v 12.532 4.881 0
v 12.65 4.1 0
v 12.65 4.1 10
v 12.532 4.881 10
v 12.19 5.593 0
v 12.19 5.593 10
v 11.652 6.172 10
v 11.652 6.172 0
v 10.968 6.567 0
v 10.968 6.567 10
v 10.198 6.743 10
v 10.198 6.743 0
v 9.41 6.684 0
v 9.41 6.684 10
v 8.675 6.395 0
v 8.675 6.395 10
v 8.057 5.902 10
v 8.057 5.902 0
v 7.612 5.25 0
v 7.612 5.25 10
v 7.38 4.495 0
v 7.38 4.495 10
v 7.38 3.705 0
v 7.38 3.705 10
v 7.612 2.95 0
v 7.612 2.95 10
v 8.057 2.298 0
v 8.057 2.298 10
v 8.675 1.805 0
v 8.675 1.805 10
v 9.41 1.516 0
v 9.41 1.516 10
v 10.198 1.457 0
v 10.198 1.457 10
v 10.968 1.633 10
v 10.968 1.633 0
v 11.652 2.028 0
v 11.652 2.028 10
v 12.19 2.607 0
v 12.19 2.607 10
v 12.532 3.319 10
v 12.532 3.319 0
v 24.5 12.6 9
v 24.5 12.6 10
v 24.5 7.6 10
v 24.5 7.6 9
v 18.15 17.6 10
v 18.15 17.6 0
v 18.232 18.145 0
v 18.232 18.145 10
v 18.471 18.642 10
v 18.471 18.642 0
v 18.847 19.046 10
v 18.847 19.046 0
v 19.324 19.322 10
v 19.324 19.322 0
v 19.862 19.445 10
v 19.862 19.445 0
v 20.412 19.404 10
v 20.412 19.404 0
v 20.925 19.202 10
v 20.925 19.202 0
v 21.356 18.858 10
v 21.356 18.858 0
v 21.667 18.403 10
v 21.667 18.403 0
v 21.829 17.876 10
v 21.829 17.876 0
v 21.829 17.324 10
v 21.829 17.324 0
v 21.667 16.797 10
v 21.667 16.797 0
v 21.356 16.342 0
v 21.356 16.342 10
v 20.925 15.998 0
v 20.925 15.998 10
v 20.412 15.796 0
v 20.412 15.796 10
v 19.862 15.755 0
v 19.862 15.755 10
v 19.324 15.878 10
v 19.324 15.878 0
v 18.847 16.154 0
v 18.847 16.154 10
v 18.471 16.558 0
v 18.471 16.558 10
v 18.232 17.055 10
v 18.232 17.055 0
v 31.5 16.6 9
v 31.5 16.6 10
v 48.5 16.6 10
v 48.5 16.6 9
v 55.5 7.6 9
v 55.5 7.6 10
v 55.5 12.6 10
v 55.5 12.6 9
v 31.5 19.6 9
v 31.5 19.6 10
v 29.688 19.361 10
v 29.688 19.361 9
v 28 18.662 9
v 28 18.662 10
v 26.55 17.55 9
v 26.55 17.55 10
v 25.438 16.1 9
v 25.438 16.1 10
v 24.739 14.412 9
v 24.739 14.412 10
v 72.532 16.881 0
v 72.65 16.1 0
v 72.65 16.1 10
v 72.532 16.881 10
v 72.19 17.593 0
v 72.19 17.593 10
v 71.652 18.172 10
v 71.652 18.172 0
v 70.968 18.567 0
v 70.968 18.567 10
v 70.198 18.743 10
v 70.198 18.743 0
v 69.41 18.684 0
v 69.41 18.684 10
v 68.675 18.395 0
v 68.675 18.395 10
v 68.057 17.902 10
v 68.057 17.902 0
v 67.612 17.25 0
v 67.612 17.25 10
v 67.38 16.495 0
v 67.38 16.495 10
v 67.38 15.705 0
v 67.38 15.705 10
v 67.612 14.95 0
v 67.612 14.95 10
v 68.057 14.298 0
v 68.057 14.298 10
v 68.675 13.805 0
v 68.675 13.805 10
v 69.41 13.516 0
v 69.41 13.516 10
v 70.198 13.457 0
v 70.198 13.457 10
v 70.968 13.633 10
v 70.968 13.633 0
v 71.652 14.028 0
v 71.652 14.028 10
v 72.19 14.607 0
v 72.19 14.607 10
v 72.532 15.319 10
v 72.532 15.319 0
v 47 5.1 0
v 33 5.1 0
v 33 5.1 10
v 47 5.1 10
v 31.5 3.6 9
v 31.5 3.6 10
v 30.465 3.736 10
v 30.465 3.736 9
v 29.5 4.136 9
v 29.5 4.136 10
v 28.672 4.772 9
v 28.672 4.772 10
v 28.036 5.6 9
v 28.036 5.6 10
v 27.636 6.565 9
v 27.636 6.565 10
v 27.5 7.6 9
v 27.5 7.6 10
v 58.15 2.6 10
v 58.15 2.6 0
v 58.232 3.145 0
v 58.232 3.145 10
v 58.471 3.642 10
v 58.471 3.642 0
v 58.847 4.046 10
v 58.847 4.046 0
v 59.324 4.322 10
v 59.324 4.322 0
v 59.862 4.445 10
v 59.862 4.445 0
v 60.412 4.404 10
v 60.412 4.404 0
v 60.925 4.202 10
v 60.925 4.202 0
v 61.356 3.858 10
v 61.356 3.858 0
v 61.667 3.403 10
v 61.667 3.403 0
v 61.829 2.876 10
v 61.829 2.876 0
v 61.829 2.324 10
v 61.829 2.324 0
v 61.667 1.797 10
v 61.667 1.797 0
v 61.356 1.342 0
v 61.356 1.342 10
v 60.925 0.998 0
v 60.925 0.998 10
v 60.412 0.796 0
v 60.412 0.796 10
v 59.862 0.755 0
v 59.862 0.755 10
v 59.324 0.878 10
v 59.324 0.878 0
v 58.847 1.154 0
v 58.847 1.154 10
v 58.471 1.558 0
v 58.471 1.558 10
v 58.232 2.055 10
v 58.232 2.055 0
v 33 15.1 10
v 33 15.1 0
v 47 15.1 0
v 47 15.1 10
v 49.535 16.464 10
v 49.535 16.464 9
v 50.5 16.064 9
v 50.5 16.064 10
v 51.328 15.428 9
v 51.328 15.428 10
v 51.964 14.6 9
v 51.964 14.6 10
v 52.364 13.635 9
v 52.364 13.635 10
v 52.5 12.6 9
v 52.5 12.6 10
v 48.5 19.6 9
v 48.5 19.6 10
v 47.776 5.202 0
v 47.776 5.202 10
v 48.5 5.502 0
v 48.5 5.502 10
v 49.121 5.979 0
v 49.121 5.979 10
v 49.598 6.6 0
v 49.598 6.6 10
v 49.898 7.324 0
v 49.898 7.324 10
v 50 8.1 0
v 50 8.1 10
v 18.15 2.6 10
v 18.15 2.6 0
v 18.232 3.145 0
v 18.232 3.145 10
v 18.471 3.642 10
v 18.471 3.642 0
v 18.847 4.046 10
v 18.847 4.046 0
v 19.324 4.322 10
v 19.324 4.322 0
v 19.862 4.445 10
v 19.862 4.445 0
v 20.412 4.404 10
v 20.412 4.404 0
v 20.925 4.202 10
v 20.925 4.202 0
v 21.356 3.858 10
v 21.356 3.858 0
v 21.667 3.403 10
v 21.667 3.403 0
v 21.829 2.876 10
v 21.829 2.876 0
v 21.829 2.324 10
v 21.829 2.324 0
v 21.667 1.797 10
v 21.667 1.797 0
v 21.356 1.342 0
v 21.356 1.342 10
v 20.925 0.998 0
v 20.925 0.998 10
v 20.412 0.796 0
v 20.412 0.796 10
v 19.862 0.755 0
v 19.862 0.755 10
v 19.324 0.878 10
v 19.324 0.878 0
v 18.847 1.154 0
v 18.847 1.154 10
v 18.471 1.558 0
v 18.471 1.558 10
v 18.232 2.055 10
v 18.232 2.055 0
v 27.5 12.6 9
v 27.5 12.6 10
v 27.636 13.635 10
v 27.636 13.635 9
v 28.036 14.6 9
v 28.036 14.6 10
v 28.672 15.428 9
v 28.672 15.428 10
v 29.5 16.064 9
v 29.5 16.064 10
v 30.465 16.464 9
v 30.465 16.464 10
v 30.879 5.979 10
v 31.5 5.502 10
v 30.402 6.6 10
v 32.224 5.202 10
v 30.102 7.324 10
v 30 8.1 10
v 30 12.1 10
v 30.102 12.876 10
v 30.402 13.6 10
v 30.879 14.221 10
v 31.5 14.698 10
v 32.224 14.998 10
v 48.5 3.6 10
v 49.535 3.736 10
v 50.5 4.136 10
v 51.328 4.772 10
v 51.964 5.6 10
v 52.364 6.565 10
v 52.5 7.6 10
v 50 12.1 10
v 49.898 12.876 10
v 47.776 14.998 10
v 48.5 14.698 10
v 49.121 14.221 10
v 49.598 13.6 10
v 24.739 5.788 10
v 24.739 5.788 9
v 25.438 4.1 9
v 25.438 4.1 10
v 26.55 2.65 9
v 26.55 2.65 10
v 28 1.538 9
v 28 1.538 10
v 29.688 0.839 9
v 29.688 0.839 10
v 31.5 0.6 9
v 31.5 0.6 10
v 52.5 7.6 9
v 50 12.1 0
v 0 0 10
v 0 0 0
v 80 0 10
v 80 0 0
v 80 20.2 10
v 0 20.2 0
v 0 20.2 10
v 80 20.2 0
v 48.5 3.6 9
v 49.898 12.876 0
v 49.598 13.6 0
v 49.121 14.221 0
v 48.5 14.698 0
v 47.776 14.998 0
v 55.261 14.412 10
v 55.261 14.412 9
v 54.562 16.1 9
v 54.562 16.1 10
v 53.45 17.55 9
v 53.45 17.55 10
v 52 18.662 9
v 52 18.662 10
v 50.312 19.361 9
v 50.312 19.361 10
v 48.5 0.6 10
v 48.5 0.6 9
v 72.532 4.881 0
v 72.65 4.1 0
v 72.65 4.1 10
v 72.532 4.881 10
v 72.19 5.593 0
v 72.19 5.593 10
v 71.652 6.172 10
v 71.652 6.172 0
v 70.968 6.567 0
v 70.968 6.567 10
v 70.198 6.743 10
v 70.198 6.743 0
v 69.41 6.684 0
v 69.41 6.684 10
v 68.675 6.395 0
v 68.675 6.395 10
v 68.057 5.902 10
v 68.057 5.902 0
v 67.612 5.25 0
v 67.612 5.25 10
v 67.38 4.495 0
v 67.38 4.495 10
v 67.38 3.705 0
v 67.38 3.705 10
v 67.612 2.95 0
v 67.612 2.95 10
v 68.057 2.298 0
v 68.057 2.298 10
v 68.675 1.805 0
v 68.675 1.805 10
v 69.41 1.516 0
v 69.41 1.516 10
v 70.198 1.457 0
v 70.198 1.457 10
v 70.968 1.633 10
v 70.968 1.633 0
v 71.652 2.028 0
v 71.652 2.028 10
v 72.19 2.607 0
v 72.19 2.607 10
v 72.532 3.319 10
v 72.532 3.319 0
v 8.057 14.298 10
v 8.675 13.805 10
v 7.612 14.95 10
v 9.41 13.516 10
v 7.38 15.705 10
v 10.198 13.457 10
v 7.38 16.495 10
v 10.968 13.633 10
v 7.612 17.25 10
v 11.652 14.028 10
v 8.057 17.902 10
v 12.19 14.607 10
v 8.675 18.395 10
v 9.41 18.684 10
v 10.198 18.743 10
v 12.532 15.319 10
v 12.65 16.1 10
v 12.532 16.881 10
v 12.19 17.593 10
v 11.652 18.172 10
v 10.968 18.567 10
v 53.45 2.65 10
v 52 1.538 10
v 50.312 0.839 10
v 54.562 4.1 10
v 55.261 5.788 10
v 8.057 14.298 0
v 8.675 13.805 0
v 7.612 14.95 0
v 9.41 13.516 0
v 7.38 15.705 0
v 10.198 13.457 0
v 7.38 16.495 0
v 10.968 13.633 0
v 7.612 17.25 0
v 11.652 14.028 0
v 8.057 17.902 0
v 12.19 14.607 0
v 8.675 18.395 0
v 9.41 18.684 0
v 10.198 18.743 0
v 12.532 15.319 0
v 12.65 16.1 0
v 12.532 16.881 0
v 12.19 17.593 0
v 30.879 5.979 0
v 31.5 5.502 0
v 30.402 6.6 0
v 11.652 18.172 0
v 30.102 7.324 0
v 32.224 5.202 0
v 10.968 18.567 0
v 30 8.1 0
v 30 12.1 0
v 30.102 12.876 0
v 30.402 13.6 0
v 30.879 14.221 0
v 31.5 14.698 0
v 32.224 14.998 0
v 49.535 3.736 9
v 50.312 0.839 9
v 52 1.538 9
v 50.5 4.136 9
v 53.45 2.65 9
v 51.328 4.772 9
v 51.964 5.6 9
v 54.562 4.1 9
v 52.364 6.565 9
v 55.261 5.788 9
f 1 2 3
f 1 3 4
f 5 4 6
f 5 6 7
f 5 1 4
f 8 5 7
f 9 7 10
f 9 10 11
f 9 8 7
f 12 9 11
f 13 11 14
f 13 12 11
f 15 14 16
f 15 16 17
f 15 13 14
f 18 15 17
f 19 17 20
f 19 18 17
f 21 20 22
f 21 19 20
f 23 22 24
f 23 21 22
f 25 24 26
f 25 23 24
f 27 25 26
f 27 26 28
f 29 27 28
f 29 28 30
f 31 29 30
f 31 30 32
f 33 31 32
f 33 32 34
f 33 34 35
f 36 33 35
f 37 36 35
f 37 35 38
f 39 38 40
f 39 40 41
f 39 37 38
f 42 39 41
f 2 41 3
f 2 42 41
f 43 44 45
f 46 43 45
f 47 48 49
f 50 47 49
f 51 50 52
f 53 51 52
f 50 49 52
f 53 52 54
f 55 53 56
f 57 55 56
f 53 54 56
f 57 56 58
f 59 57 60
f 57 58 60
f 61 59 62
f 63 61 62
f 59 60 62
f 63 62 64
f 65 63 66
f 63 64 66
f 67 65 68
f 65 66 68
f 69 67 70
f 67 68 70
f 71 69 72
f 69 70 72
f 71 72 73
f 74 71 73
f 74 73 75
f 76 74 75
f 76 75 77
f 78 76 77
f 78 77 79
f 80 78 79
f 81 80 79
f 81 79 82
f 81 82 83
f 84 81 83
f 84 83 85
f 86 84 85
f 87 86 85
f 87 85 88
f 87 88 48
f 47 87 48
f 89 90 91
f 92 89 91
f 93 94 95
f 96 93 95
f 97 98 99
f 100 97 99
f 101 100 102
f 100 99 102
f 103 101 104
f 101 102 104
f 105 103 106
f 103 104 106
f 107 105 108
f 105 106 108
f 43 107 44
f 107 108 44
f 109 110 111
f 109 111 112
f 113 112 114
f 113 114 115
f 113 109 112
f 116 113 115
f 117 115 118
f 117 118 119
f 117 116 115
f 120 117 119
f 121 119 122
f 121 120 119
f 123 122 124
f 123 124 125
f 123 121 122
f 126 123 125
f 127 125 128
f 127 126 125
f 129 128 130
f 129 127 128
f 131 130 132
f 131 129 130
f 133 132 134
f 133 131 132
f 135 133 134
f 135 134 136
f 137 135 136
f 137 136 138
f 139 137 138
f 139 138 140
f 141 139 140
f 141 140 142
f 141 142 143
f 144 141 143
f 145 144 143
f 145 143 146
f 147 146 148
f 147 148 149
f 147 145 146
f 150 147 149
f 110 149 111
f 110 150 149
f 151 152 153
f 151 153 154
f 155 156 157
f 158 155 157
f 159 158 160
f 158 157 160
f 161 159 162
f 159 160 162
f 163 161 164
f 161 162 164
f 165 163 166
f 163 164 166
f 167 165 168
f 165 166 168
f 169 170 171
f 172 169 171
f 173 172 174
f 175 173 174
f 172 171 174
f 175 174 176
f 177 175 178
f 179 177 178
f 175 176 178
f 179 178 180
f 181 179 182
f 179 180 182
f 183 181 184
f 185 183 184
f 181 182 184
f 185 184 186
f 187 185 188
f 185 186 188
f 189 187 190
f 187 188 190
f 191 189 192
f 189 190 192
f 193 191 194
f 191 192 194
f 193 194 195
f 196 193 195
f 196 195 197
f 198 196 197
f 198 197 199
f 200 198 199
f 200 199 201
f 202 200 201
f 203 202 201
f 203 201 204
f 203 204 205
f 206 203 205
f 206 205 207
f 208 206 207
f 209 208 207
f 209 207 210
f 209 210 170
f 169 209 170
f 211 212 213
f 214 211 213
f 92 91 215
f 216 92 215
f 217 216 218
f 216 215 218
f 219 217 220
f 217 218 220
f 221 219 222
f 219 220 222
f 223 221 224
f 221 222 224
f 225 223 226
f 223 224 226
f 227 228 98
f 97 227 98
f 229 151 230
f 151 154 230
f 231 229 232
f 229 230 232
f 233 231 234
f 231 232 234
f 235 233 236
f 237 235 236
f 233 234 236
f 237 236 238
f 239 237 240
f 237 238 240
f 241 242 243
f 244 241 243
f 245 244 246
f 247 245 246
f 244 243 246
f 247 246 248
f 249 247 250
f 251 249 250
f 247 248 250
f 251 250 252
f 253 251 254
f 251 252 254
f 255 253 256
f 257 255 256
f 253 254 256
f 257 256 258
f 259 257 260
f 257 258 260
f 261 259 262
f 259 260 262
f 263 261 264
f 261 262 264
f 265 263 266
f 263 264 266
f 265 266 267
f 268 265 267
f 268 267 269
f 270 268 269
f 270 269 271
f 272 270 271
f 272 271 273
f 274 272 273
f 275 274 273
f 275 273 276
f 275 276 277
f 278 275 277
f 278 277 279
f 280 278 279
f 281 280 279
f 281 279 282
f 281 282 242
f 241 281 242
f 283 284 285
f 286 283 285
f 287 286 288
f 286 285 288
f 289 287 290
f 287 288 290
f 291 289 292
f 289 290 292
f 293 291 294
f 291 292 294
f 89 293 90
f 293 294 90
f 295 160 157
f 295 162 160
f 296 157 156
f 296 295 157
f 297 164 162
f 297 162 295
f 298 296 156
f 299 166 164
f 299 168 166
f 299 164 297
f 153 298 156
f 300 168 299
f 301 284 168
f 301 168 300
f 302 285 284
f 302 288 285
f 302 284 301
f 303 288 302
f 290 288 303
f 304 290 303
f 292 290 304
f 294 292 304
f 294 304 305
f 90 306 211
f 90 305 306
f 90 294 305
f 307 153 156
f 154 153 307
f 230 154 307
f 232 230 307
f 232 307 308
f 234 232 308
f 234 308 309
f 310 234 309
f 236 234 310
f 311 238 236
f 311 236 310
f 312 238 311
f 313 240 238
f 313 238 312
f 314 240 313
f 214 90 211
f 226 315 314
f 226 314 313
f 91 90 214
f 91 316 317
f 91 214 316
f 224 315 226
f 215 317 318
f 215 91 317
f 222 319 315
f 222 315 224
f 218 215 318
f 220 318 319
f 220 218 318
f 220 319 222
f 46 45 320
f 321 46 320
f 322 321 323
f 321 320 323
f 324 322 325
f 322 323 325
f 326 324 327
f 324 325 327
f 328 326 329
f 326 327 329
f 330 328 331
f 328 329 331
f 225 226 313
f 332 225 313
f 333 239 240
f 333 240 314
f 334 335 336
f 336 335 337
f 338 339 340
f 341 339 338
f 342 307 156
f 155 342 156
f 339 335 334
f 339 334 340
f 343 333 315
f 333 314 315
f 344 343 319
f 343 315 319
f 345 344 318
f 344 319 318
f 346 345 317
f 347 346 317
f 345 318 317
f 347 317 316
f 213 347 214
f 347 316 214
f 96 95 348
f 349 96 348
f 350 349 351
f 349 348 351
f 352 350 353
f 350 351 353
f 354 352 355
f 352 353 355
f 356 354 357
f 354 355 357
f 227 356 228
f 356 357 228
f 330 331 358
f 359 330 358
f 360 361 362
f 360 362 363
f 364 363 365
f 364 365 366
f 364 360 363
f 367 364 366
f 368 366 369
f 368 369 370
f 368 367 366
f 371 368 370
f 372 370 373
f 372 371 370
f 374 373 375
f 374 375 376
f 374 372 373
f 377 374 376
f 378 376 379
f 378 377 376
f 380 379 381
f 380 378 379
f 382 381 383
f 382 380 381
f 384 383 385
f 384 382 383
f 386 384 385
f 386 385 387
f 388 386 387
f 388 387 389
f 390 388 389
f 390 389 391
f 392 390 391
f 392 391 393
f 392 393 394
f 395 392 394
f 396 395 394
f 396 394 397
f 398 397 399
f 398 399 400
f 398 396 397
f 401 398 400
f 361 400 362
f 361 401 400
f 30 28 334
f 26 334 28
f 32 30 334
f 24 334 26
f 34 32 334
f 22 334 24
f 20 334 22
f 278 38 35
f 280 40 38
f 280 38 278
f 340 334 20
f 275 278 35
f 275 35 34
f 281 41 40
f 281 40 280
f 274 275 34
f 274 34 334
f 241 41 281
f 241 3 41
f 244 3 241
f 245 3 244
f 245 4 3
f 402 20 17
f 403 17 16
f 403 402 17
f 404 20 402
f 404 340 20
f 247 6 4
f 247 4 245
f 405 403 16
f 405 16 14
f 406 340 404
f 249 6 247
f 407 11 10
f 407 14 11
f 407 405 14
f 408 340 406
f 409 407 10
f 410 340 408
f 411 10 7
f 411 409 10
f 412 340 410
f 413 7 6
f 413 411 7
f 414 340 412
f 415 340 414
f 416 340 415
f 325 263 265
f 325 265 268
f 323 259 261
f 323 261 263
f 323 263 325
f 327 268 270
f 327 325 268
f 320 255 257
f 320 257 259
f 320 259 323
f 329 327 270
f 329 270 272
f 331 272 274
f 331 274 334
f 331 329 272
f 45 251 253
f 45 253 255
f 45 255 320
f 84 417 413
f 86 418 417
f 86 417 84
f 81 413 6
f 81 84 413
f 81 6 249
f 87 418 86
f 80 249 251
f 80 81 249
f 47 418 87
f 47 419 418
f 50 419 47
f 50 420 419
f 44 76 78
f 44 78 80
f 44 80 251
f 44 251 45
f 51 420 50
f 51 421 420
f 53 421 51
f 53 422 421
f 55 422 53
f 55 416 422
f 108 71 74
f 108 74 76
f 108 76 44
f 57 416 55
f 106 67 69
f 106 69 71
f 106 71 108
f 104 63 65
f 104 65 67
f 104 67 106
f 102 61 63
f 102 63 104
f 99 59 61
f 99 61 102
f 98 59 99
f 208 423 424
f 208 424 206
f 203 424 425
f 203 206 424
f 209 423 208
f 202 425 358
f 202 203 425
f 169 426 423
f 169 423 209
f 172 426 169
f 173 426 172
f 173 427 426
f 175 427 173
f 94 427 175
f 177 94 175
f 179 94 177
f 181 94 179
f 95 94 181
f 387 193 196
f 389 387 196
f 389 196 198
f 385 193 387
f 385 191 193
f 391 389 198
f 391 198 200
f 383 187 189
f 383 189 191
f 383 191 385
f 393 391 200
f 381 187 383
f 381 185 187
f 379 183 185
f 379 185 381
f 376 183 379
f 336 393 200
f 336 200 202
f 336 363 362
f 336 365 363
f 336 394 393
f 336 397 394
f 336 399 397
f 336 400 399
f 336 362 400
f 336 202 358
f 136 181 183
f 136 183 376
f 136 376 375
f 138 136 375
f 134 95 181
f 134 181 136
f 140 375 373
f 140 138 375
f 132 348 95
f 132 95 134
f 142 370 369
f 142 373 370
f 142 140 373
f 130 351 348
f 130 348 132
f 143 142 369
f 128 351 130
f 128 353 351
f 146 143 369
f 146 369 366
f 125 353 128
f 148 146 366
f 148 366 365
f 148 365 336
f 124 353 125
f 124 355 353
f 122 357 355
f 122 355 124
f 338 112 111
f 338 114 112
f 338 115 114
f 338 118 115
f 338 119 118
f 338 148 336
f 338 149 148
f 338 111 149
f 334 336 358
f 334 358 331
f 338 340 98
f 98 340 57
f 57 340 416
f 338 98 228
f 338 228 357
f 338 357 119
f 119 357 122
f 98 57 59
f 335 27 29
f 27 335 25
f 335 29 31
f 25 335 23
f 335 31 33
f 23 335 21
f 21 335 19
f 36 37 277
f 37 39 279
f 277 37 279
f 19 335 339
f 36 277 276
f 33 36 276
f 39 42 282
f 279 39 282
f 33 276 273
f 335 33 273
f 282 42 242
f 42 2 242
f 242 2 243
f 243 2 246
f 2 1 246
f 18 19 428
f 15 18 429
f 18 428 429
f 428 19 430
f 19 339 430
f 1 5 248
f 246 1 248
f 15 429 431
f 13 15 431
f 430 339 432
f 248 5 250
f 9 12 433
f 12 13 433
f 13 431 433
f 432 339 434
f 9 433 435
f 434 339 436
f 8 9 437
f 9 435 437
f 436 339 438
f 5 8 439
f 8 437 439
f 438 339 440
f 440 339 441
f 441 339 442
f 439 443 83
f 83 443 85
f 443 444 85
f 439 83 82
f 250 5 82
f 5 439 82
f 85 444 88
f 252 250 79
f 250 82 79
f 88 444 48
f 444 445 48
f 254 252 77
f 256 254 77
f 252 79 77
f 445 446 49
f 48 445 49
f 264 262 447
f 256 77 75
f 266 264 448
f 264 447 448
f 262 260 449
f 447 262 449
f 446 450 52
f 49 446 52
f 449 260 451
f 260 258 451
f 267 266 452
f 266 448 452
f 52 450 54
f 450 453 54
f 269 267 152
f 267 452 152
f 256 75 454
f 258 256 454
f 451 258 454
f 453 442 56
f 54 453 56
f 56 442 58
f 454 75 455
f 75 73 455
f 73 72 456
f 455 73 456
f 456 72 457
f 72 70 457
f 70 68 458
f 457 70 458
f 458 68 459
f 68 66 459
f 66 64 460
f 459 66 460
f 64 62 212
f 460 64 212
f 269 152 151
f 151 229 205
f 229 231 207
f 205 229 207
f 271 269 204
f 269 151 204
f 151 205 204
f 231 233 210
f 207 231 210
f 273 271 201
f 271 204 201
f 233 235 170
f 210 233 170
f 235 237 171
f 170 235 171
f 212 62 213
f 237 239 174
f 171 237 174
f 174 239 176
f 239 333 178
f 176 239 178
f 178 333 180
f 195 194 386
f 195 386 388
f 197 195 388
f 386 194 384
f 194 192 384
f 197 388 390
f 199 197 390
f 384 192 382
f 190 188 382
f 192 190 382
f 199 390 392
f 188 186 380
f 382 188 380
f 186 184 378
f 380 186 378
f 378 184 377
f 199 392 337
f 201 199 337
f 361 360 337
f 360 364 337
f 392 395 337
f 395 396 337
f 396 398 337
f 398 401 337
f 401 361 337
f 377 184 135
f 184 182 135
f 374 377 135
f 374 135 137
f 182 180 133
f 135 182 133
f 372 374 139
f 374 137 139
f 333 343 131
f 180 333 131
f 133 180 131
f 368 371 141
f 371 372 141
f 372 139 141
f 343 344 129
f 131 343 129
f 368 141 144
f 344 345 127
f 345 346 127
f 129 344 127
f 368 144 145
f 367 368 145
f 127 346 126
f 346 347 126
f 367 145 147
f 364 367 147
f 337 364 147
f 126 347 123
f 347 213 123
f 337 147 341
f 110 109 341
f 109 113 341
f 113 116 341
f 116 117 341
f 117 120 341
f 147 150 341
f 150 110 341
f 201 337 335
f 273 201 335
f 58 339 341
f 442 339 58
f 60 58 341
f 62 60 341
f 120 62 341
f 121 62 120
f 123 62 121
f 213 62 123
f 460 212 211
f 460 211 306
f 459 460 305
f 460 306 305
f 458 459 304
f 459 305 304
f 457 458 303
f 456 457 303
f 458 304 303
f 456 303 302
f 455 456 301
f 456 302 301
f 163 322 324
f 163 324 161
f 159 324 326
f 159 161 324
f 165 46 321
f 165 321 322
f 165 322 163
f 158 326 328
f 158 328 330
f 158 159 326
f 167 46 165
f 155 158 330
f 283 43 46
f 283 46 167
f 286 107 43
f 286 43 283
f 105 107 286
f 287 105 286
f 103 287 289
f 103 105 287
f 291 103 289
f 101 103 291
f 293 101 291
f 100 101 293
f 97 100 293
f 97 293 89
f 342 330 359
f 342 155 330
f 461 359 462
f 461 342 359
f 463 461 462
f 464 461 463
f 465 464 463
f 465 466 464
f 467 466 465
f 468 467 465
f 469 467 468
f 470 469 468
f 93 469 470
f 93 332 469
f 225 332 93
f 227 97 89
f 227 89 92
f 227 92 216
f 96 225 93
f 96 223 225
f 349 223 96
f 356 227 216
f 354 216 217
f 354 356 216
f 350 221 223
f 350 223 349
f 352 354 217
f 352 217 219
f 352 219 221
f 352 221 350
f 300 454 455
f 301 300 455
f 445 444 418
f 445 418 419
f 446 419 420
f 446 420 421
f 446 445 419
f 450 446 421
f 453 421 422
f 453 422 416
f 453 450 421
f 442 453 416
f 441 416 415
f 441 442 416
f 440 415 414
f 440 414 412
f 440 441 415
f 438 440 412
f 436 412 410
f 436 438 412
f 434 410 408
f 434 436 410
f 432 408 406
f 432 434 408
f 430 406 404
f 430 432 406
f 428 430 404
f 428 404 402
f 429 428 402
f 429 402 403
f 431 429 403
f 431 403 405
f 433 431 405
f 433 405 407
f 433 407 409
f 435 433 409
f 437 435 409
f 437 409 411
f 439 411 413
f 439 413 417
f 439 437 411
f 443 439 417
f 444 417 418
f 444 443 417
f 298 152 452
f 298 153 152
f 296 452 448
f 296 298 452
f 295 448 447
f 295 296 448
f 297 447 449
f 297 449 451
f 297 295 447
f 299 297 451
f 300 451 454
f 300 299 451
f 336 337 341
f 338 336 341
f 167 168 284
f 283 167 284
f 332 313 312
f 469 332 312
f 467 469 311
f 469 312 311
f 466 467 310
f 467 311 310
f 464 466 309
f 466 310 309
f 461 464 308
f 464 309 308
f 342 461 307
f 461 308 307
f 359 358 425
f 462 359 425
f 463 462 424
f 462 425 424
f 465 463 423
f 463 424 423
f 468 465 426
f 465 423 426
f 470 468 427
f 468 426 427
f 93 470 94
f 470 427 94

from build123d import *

# Parameters (mm, degrees)
SKIZZE1_W                        = 80
SKIZZE1_H                        = 20.2
SKIZZE1_R                        = 2.65
SKIZZE1_W_2                      = 20
SKIZZE1_H_2                      = 10
AUFSATZ_LINEAR_AUSTRAGEN1_DEPTH  = 10
VERRUNDUNG1_R                    = 3
F_3_7_3_7_DURCHMESSER_BOHRUNG1_D = 3.7
SCHNITT_LINEAR_AUSTRAGEN1_DEPTH  = 1


with BuildPart() as part:
    # Skizze1 → Aufsatz-Linear austragen1 (new body)
    with BuildSketch(Plane.XY):
        with Locations((40, 10.1)):
            Rectangle(SKIZZE1_W, SKIZZE1_H)
        with Locations((10, 16.1)):
            Circle(SKIZZE1_R, mode=Mode.SUBTRACT)
        with Locations((10, 4.1)):
            Circle(SKIZZE1_R, mode=Mode.SUBTRACT)
        with Locations((70, 16.1)):
            Circle(SKIZZE1_R, mode=Mode.SUBTRACT)
        with Locations((70, 4.1)):
            Circle(SKIZZE1_R, mode=Mode.SUBTRACT)
        with Locations((40, 10.1)):
            Rectangle(SKIZZE1_W_2, SKIZZE1_H_2, mode=Mode.SUBTRACT)
    extrude(amount=AUFSATZ_LINEAR_AUSTRAGEN1_DEPTH)

    # Verrundung1
    verrundung1_edges = [part.edges().sort_by_distance(p)[0] for p in [
        (50, 5.1, 5),
        (50, 15.1, 5),
        (30, 15.1, 5),
        (30, 5.1, 5),
    ]]
    fillet(verrundung1_edges, radius=VERRUNDUNG1_R)

    # Ø3.7 (3.7) Durchmesser Bohrung1 (through all)
    with Locations(Plane.XY.offset(10)):
        with Locations((20, 17.6), (20, 2.6), (60, 2.6)):
            Hole(F_3_7_3_7_DURCHMESSER_BOHRUNG1_D / 2)

    # Skizze7 → Schnitt-Linear austragen1 (cut)
    with BuildSketch(Plane.XY.offset(10)):
        with BuildLine():
            Line((24.5, 12.6), (24.5, 7.6))
            ThreePointArc((24.5, 7.6), (26.550252532, 2.650252532), (31.5, 0.6))
            Line((31.5, 0.6), (48.5, 0.6))
            ThreePointArc((48.5, 0.6), (53.449747468, 2.650252532), (55.5, 7.6))
            Line((55.5, 7.6), (55.5, 12.6))
            ThreePointArc((55.5, 12.6), (53.449747468, 17.549747468), (48.5, 19.6))
            Line((48.5, 19.6), (31.5, 19.6))
            ThreePointArc((31.5, 19.6), (26.550252532, 17.549747468), (24.5, 12.6))
        make_face()
        with BuildLine():
            Line((31.5, 16.6), (48.5, 16.6))
            ThreePointArc((48.5, 16.6), (51.328427125, 15.428427125), (52.5, 12.6))
            Line((52.5, 12.6), (52.5, 7.6))
            ThreePointArc((52.5, 7.6), (51.328427125, 4.771572875), (48.5, 3.6))
            Line((48.5, 3.6), (31.5, 3.6))
            ThreePointArc((31.5, 3.6), (28.671572875, 4.771572875), (27.5, 7.6))
            Line((27.5, 7.6), (27.5, 12.6))
            ThreePointArc((27.5, 12.6), (28.671572875, 15.428427125), (31.5, 16.6))
        make_face(mode=Mode.SUBTRACT)
    extrude(amount=-SCHNITT_LINEAR_AUSTRAGEN1_DEPTH, mode=Mode.SUBTRACT)


solid = part.part
